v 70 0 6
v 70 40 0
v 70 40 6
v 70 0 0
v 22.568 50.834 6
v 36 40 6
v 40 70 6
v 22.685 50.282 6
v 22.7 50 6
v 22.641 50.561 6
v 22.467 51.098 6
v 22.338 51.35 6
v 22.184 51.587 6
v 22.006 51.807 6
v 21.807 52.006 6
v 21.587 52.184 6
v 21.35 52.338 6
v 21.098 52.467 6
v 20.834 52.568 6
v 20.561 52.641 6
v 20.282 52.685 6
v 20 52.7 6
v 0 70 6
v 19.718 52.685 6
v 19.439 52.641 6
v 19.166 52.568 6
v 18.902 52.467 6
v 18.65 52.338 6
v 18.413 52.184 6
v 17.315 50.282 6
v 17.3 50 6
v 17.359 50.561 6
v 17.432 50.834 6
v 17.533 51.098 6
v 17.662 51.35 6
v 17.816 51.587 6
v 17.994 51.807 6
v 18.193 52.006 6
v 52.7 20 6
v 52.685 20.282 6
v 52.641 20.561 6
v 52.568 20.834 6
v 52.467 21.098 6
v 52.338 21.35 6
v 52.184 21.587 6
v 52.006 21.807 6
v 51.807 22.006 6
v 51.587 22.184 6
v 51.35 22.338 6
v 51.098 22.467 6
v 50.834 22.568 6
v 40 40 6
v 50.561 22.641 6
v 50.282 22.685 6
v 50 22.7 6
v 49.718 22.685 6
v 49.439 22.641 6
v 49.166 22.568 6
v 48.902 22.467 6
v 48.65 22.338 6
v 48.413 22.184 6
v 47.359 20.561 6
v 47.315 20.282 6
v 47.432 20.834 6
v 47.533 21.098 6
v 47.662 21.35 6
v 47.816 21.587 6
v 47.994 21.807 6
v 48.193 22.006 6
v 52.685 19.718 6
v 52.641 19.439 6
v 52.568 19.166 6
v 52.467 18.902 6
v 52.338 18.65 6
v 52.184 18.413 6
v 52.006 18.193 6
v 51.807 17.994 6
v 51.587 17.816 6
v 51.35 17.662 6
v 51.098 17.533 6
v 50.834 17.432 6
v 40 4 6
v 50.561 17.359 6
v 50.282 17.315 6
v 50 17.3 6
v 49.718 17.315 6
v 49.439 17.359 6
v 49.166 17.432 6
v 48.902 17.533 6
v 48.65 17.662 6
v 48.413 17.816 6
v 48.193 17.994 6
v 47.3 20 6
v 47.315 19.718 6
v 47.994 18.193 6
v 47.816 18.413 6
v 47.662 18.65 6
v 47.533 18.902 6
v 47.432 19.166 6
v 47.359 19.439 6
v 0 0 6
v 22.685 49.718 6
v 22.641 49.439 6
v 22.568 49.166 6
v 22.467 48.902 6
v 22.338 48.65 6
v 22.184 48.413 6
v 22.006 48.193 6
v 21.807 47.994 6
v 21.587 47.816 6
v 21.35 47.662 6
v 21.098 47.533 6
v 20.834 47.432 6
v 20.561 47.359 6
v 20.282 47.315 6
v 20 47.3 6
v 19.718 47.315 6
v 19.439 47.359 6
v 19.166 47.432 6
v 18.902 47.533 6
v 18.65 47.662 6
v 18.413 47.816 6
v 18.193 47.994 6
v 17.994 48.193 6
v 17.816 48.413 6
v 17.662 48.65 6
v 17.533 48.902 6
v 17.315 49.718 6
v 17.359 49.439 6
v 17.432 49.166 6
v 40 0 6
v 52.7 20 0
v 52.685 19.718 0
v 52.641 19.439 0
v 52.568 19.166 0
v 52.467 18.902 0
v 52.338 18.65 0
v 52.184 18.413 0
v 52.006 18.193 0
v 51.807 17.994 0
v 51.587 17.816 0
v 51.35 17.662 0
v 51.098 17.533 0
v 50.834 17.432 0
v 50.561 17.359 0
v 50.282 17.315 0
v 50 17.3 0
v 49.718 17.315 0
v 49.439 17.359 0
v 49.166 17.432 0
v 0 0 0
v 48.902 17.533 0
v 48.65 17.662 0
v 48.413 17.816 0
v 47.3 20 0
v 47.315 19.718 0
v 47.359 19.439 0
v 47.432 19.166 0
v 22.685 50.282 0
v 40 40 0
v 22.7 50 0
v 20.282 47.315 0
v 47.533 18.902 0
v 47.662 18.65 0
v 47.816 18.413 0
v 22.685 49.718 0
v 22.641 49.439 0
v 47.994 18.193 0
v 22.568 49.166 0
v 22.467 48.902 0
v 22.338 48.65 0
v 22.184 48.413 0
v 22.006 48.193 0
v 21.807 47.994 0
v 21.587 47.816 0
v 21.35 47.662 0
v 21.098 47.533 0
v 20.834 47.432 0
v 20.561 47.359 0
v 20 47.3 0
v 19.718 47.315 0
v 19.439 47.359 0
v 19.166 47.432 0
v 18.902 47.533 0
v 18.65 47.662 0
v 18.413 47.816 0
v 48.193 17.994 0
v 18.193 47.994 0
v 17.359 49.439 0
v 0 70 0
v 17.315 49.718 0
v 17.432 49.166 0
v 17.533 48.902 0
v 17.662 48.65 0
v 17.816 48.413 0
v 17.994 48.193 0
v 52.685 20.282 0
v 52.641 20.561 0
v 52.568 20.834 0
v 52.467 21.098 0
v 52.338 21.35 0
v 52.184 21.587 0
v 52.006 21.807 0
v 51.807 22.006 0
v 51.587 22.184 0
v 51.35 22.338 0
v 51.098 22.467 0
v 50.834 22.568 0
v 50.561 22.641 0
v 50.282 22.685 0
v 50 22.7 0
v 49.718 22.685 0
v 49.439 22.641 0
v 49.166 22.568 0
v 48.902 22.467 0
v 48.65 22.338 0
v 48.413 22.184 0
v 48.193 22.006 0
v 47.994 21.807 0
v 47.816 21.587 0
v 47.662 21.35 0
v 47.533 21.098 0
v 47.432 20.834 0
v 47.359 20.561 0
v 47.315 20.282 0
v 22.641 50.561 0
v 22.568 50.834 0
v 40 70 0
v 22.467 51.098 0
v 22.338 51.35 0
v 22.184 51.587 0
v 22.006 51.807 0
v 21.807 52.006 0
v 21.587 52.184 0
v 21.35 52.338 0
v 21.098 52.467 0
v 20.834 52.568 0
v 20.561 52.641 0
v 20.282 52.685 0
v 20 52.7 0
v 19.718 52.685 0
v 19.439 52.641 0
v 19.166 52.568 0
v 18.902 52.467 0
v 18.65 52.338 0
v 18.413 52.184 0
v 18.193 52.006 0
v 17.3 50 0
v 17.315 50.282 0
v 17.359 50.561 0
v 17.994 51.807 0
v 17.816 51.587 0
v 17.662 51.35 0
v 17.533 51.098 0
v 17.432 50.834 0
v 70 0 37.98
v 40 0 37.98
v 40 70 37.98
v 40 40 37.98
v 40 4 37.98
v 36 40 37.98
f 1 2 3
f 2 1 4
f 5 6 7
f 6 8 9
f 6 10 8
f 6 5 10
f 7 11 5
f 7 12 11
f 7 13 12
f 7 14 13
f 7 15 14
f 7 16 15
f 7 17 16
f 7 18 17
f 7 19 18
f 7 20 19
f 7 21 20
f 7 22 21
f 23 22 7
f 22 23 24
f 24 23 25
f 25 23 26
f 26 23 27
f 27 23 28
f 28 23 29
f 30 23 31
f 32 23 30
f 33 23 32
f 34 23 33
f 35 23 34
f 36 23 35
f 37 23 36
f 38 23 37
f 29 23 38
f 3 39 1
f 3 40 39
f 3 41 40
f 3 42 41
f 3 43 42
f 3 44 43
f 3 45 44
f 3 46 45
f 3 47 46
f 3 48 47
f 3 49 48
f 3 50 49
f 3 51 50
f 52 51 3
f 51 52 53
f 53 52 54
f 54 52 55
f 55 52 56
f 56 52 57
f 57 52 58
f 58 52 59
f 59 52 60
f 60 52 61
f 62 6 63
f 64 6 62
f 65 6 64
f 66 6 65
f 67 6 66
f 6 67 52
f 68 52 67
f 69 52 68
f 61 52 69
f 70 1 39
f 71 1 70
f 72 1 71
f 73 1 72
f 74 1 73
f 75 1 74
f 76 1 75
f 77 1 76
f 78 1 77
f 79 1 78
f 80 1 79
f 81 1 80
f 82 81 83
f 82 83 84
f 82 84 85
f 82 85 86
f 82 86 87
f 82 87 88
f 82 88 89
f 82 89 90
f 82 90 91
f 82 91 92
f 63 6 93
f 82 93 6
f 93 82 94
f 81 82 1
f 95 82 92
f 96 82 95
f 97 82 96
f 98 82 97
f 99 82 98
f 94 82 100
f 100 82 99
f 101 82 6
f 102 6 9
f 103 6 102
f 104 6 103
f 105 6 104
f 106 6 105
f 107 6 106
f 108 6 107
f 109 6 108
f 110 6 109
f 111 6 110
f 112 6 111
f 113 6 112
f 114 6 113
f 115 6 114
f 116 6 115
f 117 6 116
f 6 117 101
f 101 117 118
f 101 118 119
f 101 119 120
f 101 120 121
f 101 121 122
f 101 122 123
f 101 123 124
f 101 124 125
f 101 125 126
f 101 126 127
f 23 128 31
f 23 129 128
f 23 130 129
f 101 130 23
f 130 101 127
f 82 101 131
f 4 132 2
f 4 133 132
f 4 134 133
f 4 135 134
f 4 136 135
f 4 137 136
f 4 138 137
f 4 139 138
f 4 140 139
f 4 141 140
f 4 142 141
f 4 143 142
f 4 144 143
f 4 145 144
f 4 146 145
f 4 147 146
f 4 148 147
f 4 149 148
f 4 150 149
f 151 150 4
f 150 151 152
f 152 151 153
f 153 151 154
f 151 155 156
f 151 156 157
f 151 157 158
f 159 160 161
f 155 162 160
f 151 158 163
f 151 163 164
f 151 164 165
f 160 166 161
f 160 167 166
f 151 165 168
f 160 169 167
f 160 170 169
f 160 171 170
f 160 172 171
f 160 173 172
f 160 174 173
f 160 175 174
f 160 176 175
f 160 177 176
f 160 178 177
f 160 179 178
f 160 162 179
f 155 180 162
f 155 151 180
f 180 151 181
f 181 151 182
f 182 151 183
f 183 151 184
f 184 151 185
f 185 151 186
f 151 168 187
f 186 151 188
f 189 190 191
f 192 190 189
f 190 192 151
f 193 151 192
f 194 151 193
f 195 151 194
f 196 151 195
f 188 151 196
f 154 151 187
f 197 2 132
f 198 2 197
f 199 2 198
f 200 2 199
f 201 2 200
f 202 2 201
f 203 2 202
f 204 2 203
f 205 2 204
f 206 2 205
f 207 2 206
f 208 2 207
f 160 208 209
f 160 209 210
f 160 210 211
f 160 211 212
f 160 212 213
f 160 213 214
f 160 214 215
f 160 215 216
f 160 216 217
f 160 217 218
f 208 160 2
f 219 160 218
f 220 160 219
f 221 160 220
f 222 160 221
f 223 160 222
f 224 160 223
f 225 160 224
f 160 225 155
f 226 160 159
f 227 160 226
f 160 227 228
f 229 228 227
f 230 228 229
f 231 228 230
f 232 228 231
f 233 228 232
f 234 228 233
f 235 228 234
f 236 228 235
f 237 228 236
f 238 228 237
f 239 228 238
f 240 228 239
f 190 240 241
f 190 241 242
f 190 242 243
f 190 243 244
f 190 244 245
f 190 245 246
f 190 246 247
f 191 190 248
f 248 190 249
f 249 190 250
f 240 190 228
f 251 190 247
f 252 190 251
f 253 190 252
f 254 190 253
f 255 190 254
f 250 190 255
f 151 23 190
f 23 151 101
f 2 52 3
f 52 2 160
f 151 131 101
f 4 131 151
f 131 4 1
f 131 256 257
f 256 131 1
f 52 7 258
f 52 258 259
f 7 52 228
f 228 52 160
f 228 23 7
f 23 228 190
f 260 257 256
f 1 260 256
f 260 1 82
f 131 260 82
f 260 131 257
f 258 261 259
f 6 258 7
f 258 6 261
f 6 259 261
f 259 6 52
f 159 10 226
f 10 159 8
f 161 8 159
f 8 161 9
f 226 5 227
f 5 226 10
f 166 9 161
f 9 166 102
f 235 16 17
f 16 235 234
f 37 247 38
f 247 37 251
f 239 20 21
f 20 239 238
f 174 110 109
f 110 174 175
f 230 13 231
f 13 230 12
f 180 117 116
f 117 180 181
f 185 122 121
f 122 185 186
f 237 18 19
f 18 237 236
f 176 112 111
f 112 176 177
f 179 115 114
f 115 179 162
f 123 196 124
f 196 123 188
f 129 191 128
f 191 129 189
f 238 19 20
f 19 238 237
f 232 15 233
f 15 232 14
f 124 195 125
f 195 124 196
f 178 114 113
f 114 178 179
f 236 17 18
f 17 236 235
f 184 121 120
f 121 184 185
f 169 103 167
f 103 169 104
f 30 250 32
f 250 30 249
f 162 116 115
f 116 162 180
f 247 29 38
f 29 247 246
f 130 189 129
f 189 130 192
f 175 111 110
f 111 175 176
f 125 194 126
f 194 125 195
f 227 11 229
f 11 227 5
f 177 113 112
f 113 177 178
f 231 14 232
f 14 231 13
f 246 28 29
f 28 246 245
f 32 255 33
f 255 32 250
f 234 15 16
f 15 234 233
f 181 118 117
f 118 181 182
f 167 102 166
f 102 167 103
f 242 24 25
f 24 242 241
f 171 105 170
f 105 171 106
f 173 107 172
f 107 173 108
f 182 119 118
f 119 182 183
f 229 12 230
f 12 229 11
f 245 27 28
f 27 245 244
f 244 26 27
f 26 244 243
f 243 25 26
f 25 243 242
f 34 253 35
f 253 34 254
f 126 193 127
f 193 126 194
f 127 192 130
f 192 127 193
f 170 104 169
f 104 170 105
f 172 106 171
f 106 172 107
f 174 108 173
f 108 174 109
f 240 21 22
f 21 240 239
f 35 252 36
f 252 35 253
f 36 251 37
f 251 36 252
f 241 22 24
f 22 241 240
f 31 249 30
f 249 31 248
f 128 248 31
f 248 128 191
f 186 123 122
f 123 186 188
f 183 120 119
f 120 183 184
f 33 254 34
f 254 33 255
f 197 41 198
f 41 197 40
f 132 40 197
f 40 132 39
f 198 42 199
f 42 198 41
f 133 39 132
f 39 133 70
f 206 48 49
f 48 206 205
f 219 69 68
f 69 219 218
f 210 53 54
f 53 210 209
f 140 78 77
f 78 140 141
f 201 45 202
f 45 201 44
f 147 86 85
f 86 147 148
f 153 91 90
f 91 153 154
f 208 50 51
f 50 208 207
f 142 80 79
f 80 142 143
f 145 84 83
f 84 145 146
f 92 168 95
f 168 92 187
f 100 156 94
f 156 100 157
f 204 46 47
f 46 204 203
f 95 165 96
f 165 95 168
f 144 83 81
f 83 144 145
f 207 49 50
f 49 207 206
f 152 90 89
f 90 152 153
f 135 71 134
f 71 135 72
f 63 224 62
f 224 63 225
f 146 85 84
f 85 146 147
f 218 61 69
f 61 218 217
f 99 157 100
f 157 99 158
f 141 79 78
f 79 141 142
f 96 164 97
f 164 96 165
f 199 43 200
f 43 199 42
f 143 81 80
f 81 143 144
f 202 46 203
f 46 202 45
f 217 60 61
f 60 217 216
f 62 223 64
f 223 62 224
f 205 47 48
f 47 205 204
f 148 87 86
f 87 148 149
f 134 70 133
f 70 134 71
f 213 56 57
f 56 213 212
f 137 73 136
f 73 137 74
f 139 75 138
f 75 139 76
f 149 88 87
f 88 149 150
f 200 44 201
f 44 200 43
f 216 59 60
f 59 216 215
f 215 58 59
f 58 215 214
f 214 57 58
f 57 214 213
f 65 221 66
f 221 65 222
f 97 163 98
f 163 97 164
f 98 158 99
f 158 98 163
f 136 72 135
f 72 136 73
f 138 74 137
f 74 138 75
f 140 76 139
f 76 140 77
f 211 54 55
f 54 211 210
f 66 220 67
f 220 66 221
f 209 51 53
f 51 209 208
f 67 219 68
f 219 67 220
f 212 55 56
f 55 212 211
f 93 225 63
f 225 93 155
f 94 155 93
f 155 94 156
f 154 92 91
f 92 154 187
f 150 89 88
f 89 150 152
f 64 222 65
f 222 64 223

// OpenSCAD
// Reinforced right-angle gusset for 40 mm profile.
$fn = 60;
eps = 0.02;
profile = 40;
arm = 70;
plate_t = 6;
rib_t = 4;
rib_h = 32;
module rib_x() {
    translate([profile, 0, plate_t - eps]) linear_extrude(height = rib_h)
        polygon(points = [[0, 0], [arm - profile, 0], [0, rib_t]]);
}
module rib_y() {
    translate([profile, profile, plate_t - eps]) rotate([0, 0, 90]) linear_extrude(height = rib_h)
        polygon(points = [[0, 0], [arm - profile, 0], [0, rib_t]]);
}
difference() {
    union() { cube([arm, profile, plate_t]); cube([profile, arm, plate_t]); rib_x(); rib_y(); }
    for (p = [[profile / 2, arm - profile / 2], [arm - profile / 2, profile / 2]])
        translate([p[0], p[1], -eps]) cylinder(d = 5.4, h = plate_t + 2 * eps);
}
